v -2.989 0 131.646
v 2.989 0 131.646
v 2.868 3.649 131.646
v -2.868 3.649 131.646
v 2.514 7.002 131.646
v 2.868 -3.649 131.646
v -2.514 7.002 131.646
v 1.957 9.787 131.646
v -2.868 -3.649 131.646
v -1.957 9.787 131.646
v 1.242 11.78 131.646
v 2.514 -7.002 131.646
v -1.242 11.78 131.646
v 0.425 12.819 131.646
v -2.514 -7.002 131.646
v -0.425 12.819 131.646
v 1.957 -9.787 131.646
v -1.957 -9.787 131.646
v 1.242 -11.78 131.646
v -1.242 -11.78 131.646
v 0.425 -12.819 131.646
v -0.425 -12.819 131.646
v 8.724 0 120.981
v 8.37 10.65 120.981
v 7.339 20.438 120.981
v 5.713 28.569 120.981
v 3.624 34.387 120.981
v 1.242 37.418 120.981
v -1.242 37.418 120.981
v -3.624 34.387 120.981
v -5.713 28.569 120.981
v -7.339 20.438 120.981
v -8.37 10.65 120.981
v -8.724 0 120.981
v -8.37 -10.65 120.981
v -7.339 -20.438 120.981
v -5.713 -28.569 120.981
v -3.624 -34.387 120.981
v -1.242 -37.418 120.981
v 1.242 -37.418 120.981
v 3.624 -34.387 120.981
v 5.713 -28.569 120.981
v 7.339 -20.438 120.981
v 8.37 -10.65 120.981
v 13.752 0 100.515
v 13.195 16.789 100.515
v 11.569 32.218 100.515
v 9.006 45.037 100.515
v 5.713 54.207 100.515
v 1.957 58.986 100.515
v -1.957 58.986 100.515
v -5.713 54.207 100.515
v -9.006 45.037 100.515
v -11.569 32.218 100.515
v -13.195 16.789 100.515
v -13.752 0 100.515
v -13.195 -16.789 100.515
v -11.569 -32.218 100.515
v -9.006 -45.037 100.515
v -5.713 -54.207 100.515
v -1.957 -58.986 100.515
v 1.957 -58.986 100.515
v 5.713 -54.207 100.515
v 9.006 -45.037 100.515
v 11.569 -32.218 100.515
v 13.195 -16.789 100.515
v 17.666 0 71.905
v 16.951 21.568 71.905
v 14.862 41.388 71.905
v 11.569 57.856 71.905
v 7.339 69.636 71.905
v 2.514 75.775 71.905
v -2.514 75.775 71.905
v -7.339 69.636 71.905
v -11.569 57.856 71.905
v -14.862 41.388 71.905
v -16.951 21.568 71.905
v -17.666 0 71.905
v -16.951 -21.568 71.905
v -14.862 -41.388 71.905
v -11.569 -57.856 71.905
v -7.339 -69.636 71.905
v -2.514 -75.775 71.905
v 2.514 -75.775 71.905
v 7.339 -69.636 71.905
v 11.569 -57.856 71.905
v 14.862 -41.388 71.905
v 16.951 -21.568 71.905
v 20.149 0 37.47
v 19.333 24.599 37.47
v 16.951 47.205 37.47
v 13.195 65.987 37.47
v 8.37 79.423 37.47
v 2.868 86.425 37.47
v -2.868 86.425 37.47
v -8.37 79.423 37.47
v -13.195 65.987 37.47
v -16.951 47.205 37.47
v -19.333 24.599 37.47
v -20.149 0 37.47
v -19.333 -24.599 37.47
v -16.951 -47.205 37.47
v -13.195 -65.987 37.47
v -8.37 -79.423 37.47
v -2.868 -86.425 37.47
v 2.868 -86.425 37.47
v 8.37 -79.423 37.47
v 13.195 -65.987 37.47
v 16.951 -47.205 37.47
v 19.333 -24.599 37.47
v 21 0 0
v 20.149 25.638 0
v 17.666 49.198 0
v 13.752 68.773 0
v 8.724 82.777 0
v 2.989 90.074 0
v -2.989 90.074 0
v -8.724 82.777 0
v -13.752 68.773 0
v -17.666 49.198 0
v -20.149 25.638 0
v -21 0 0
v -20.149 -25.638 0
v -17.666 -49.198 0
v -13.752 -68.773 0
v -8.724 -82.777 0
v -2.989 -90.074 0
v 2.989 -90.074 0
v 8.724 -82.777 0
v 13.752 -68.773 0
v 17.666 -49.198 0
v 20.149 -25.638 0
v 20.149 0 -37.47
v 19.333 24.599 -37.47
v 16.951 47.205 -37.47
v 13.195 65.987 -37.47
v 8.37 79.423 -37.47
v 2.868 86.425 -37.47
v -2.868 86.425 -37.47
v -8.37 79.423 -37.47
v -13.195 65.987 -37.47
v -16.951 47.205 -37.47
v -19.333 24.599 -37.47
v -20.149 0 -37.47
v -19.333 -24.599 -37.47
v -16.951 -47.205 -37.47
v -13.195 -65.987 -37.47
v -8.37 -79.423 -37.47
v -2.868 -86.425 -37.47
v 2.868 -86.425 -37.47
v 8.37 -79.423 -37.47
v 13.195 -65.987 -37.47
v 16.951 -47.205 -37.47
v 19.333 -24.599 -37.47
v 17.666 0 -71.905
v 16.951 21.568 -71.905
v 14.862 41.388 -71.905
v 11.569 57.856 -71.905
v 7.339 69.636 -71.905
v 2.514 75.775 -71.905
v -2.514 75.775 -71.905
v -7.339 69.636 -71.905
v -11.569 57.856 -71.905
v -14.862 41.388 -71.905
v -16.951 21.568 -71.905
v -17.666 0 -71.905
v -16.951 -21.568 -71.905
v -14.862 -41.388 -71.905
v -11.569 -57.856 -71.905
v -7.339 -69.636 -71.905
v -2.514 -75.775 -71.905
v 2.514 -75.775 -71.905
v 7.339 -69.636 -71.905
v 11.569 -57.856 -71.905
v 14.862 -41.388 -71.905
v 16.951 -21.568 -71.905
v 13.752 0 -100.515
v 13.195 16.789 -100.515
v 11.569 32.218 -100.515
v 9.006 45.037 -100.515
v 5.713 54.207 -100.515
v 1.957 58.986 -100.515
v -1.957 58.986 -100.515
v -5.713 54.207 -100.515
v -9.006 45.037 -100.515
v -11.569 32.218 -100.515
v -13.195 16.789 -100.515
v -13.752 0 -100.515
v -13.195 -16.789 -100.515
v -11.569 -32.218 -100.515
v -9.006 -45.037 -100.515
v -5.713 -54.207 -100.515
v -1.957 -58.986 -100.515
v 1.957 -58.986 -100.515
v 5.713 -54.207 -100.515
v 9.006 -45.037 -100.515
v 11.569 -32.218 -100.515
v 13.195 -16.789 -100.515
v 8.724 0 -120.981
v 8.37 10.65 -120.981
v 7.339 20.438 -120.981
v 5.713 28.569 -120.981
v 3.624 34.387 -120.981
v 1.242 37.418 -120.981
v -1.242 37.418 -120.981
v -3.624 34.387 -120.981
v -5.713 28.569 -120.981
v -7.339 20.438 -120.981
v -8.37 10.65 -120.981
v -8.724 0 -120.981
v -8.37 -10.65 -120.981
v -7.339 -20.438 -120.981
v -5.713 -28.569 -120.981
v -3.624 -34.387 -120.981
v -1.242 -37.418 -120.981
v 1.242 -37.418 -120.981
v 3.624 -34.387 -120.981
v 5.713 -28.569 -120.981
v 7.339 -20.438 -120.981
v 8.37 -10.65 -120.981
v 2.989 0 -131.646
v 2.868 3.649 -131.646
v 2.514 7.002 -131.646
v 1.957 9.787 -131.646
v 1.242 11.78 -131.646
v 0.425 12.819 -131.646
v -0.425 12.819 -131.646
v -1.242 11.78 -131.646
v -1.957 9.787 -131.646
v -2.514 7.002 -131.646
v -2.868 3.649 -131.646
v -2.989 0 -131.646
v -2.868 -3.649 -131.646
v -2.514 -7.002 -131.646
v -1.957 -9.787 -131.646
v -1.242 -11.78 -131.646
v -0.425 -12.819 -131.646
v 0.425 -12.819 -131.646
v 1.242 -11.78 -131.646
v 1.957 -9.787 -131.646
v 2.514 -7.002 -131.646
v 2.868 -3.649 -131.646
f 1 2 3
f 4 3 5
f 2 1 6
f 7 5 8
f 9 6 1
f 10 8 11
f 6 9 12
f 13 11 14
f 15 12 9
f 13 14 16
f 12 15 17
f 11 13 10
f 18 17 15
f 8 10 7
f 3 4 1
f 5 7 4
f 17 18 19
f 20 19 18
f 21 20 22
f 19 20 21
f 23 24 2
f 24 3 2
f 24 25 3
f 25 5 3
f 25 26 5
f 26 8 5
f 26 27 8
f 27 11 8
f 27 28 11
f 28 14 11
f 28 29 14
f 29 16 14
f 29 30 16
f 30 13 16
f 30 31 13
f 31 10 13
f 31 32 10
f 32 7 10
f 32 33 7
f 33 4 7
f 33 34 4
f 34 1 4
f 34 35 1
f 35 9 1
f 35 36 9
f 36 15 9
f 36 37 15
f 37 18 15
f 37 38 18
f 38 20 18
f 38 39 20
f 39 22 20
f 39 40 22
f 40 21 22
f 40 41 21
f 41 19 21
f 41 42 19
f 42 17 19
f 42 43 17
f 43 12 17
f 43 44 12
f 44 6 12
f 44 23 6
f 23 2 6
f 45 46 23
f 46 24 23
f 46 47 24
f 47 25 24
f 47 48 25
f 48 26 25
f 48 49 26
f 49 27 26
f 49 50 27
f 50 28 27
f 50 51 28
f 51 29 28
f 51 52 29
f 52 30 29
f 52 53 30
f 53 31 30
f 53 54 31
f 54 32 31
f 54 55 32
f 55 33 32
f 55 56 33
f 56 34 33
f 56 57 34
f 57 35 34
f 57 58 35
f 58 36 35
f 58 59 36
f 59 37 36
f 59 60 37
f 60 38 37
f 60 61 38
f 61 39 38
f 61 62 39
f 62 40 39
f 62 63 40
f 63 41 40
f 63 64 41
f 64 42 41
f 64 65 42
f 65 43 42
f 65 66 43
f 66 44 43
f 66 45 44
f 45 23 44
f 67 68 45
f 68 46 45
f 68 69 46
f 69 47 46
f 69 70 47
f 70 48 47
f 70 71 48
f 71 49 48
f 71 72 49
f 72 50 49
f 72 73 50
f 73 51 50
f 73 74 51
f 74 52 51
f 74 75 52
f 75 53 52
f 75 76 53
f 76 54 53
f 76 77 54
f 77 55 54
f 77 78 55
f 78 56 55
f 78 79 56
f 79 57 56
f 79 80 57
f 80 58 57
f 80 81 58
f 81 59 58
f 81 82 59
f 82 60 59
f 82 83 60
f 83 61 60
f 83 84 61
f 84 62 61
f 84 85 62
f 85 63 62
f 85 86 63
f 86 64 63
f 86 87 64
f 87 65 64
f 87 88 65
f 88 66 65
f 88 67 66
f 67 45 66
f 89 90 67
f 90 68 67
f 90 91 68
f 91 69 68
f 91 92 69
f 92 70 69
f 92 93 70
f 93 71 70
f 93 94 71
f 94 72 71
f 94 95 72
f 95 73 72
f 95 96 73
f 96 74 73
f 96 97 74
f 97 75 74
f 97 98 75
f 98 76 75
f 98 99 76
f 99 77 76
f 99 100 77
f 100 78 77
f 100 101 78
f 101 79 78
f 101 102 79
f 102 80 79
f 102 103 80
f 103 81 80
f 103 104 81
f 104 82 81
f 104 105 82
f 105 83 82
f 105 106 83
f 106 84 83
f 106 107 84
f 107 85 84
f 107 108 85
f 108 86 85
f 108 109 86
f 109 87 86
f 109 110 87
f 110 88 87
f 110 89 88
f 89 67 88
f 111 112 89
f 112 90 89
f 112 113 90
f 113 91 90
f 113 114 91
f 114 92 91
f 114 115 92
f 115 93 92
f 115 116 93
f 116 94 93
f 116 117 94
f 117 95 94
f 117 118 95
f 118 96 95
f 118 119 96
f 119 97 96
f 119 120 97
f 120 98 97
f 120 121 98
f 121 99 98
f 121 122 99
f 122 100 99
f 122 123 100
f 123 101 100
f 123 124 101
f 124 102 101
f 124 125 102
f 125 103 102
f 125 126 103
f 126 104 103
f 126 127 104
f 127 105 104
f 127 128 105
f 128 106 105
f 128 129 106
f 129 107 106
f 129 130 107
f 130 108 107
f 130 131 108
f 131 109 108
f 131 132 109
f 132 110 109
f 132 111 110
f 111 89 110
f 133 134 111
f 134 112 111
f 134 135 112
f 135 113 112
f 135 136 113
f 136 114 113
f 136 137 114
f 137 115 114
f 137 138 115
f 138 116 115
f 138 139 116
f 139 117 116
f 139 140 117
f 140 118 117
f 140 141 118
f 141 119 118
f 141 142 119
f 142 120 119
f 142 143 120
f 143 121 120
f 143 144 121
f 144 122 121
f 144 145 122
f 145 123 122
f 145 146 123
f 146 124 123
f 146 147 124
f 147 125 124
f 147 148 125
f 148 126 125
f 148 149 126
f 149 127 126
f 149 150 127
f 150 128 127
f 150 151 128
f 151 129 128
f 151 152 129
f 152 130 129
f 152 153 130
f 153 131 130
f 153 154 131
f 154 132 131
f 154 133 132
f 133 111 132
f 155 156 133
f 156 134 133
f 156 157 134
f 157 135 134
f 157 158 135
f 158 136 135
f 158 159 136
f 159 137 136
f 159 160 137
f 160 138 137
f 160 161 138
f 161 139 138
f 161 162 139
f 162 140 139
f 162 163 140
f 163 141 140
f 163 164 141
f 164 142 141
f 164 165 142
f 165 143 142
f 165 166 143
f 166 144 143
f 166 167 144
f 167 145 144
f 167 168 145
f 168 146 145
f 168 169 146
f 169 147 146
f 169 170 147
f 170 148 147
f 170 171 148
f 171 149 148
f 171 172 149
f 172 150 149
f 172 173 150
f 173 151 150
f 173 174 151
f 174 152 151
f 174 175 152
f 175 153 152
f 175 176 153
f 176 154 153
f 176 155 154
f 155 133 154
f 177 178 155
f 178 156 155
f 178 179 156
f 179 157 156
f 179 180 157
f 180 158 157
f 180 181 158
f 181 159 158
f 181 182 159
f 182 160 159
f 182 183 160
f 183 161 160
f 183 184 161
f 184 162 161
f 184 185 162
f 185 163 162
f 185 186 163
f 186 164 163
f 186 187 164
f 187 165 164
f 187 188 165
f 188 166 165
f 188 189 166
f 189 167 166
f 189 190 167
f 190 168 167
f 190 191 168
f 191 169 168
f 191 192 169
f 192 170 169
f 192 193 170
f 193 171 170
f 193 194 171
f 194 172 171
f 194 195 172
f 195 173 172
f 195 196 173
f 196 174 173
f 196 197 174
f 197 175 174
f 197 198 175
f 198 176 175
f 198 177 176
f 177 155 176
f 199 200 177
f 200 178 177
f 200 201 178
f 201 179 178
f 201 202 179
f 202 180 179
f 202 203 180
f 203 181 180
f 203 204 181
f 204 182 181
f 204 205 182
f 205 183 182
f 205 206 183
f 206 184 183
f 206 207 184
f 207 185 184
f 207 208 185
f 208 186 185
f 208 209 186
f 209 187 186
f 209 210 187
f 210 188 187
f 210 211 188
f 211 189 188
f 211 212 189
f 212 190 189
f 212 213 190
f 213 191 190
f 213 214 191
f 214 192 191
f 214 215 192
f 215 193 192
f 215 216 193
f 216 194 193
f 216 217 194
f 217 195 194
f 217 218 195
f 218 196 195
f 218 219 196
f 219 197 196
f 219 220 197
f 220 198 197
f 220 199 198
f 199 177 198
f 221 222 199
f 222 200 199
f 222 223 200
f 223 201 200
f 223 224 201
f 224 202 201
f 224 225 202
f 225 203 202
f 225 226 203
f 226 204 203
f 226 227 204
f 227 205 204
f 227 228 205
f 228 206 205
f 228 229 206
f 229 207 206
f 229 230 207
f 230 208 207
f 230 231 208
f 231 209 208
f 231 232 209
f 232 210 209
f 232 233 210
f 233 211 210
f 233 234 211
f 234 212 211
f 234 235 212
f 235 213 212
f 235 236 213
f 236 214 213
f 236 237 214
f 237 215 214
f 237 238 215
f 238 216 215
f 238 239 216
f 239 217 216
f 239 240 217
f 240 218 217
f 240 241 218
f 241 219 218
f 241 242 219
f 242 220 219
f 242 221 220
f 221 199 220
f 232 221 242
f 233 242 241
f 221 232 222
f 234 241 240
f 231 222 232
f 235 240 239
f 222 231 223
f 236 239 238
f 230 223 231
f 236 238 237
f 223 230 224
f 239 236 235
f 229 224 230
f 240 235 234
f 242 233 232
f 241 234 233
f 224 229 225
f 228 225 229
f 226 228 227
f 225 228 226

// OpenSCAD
// Generated by SolidPython 1.0.1 on 2020-07-29 00:46:45


scale(v = [3, 13, 19]) {
	sphere(r = 7);
}
/***********************************************
*********      SolidPython code:      **********
************************************************
 
# import packages: SolidPython
from solid import *
from solid.utils import *
from itertools import chain, combinations, permutations


class Resize:

    def __init__(self, scad_file):
        self.scad_file = scad_file
        #self.scad_file = import_scad(scad_file)
        # cone/cylinder param:
        self.r1 = 0
        self.r2 = 0
        self.h = 0
        # rectangular prism param:
        self.w = 0
        self.l = 0
        # ellipse param:
        self.r = 0

    # import OpenScad code (file name corresponds to shape)


    # classify shape + parameters
    def assign(self, param1, param2, param3):
        if self.scad_file == 'cone.scad':
            self.r1 = param1
            self.r2 = param2
            self.h = param3
        elif self.scad_file == 'cylinder.scad':
            self.r1 = param1
            self.r2 = param2
            self.h = param3
        elif self.scad_file == 'rectangularPrism.scad':
            self.h = param1
            self.l = param2
            self.w = param3
        else:
            self.r = param1
            self.h = param2

    # resize parameters
    def iterate(self):
        x = range(3, 20, 2)
        i = 1
        if self.scad_file == 'cone.scad':
            tempList = list(permutations(x, 2))
            for temp in tempList:
                param1 = temp[0]
                param2 = temp[1]
                filepath = 'produced_scad_files/' + 'cone' + str(param1) + '_' + str(param2) + '_' + '.scad'
                scad_render_to_file(cylinder(h=param1, r1=param2, r2=0), filepath)

        elif self.scad_file == 'cylinder.scad':
            tempList = list(permutations(x, 3))
            for temp in tempList:
                param1 = temp[0]
                param2 = temp[1]
                filepath = 'produced_scad_files/' + 'cylinder' + str(param1) + '_' + str(param2) + '_' + '.scad'
                scad_render_to_file(cylinder(h=param1, r1=param2, r2=param2), filepath)

        elif self.scad_file == 'rectangularPrism.scad':
            tempList = list(permutations(x, 3))
            for temp in tempList:
                param1 = temp[0]
                param2 = temp[1]
                param3 = temp[2]
                filepath = 'produced_scad_files/' + 'rectangularPrism' + str(param1) + '_' + str(param2) + '_' + str(
                    param3) + '.scad'
                scad_render_to_file(cube(size=(param1, param2, param3)), filepath)

        elif self.scad_file == 'ellipse.scad':
            tempList = list(permutations(x, 4))
            for temp in tempList:
                param1 = temp[0]
                param2 = temp[1]
                param3 = temp[2]
                param4 = temp[3]
                filepath = 'produced_scad_files/' + 'ellipse' + str(param1) + '_' + str(param2) + '_' + str(param3) + '_' + str(param4) + '.scad'
                scad_render_to_file(scale([param1, param2, param3])(sphere(r=param4)), filepath)

    def render_to_scadfile(self):
        scad_render_to_file(scad, 'example.scad') 
 
************************************************/
